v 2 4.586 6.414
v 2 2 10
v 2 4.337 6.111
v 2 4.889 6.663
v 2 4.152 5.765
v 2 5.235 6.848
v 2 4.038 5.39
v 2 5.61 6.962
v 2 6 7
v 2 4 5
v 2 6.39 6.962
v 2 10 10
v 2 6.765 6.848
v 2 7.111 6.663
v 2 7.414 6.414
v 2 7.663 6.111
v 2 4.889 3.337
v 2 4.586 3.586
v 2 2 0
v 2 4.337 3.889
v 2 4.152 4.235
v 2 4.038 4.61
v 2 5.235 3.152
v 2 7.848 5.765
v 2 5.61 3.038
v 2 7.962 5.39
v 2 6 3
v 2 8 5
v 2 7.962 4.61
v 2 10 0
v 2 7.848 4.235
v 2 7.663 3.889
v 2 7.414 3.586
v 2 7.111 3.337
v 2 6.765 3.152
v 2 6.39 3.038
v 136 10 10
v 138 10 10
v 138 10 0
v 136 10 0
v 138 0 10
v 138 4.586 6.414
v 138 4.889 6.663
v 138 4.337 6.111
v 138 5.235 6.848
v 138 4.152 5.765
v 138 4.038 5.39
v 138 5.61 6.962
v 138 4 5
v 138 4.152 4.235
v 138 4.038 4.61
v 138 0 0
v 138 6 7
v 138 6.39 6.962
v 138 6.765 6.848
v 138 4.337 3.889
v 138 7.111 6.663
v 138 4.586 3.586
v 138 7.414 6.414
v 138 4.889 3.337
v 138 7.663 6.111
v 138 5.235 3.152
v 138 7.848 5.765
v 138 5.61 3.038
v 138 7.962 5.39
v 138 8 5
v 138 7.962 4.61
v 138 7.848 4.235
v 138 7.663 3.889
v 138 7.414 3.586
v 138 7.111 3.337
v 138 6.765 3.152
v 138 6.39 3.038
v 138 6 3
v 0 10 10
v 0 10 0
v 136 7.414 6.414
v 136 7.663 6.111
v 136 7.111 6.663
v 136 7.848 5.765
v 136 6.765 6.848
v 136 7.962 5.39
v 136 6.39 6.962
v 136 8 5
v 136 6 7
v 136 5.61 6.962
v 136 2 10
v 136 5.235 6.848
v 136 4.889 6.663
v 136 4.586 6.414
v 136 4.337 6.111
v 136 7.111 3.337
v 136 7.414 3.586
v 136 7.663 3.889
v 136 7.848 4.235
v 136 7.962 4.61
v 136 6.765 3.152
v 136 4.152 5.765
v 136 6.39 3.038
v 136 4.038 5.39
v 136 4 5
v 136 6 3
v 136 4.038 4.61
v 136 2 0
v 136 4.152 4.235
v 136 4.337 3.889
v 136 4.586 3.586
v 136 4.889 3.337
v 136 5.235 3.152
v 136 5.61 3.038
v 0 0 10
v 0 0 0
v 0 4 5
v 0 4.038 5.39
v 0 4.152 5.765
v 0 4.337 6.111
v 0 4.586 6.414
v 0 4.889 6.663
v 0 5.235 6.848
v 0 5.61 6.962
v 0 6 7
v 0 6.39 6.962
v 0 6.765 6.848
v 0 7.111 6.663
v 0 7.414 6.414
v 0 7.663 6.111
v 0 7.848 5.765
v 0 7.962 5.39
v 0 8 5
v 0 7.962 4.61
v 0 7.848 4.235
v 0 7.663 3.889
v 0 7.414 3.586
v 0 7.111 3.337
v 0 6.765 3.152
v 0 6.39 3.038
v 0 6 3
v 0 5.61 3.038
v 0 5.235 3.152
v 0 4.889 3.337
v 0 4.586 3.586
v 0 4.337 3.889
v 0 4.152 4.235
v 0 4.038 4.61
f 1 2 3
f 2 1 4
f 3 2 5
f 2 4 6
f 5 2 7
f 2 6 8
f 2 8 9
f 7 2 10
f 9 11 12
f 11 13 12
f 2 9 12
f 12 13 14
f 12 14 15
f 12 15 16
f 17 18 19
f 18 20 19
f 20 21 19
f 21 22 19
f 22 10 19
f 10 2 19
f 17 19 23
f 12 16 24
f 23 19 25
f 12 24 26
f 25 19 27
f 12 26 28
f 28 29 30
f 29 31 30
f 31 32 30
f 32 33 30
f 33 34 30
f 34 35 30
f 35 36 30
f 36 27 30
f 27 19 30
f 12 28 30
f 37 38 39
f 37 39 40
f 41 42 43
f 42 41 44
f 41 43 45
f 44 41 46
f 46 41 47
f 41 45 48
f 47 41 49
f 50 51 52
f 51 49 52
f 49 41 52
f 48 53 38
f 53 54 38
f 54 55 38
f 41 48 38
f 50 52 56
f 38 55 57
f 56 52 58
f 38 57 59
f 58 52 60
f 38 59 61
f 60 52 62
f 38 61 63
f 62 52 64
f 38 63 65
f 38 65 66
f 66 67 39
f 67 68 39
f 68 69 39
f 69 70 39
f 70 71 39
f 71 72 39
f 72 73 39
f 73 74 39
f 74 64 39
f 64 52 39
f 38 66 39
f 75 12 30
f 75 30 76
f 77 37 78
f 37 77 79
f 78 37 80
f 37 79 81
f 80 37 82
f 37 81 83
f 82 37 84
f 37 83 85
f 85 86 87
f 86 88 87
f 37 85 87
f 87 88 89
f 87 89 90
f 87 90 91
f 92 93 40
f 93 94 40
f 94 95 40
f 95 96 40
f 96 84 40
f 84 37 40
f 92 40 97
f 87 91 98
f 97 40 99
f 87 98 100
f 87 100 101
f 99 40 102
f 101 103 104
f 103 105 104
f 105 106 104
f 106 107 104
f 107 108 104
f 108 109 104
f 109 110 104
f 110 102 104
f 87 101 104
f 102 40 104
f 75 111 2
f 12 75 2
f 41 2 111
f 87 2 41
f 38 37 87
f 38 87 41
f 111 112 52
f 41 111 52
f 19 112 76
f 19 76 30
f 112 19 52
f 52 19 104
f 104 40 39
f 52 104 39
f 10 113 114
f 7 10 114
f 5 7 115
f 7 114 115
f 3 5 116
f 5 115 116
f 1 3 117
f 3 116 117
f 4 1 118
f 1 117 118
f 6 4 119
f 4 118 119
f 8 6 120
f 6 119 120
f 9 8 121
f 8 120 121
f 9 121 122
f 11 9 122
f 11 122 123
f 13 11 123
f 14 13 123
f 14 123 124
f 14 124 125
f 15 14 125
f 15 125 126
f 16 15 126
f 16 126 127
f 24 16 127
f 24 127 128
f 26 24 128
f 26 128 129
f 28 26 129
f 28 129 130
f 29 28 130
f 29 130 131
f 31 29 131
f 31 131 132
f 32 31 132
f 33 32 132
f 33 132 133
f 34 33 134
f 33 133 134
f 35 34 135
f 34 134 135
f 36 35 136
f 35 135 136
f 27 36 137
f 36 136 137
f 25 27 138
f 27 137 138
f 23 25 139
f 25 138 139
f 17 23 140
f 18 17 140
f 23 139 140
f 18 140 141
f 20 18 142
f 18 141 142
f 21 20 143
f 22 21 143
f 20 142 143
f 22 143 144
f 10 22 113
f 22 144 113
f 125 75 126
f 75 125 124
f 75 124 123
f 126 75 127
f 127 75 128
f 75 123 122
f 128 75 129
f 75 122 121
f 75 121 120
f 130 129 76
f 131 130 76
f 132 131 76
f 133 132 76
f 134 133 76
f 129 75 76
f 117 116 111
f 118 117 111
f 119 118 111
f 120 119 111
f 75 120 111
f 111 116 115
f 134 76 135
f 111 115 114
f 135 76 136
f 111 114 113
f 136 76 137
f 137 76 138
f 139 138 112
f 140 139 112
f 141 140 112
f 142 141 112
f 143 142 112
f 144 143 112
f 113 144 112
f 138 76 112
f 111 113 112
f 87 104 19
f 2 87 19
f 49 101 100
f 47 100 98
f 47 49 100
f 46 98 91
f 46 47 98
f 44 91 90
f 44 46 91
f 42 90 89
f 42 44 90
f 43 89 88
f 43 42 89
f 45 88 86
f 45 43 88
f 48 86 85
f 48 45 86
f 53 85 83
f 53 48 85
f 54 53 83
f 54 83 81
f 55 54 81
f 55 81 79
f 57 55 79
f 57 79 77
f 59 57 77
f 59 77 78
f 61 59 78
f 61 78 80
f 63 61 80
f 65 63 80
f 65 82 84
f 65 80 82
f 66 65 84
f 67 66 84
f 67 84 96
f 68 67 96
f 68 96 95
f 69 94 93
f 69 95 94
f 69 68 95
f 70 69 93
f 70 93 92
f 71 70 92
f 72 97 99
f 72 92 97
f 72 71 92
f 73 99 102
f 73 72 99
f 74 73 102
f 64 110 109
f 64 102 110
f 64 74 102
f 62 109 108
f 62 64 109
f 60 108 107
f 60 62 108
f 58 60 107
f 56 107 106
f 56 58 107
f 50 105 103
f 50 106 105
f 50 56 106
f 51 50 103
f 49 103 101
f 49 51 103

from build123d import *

# Parameters (mm, degrees)
BOSS_EXTRUDE1_DEPTH = 10
SKETCH3_R           = 2
CUT_EXTRUDE2_DEPTH  = 136


with BuildPart() as part:
    # Sketch1 → Boss-Extrude1 (new body)
    with BuildSketch(Plane.XY):
        Polygon((0, 0), (138, 0), (138, 10), (136, 10), (136, 2), (2, 2), (2, 10), (0, 10), align=None)
    extrude(amount=BOSS_EXTRUDE1_DEPTH)

    # Sketch3 → Cut-Extrude2 (cut)
    with BuildSketch(Plane.ZY):
        with Locations(Location((5, 6, 0), (0, 0, 270))):
            Circle(SKETCH3_R)
    cut_extrude2 = extrude(amount=-CUT_EXTRUDE2_DEPTH, mode=Mode.SUBTRACT)

    # Mirror1: Cut-Extrude2 across plane
    add(cut_extrude2.mirror(Plane.ZY.offset(-69)), mode=Mode.SUBTRACT)


solid = part.part
